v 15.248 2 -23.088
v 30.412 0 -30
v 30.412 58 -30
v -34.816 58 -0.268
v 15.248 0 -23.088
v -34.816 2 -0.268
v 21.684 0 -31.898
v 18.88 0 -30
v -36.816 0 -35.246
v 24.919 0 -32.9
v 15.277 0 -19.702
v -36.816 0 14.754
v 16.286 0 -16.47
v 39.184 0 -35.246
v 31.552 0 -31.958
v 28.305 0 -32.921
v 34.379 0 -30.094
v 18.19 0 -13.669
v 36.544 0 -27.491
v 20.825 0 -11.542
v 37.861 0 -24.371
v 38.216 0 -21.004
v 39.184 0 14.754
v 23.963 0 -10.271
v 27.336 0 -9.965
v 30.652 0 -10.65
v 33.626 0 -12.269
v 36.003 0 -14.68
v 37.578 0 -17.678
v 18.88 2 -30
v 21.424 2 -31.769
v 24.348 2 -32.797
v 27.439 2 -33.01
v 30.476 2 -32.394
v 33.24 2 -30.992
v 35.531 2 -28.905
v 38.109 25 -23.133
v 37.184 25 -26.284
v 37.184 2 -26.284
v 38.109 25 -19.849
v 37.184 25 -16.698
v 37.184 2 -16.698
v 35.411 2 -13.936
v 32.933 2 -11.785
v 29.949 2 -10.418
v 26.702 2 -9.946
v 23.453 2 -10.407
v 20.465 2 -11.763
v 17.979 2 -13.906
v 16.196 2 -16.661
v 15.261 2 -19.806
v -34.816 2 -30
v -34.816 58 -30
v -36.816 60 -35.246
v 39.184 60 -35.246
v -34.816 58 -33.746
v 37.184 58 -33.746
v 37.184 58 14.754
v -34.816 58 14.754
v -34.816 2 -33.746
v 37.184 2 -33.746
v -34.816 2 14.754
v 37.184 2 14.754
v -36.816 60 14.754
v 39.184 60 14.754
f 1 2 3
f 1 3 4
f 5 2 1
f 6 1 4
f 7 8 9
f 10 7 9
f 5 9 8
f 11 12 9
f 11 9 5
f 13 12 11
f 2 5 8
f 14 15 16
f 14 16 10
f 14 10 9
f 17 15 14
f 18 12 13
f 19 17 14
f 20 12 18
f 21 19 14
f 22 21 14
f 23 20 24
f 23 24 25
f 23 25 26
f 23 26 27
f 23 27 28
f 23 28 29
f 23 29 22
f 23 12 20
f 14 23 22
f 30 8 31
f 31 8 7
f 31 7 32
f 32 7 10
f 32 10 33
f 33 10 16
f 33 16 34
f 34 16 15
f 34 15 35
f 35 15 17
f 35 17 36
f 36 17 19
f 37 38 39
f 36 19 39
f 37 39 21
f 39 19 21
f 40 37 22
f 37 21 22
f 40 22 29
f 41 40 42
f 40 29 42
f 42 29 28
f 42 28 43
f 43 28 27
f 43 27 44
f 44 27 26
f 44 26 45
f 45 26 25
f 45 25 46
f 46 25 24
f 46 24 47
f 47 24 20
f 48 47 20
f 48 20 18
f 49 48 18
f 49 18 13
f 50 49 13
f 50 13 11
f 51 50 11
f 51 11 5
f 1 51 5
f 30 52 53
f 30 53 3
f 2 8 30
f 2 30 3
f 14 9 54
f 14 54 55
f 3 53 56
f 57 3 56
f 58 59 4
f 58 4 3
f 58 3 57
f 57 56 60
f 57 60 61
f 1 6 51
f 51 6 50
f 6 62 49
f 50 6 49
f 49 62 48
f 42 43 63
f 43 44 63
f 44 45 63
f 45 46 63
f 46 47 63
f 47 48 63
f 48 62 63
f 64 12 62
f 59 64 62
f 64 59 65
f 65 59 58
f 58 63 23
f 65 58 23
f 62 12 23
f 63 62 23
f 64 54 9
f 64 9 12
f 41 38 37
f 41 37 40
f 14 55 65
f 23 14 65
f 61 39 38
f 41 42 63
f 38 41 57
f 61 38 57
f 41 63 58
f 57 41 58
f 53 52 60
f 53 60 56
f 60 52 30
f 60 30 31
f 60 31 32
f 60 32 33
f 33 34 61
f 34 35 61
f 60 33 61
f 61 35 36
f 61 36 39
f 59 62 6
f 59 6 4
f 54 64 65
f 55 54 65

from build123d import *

# Parameters (mm, degrees)
F0_W     = 76
F0_H     = 50
F1_DEPTH = 60
F2_W     = 72
F2_H     = 56
F3_DEPTH = 48.5
F4_R     = 11.544543
F5_DEPTH = 25
F7_DEPTH = 58


with BuildPart() as f1:
    # F0 (on Front) → F1 (new body)
    with BuildSketch(Plane.XZ):
        with Locations((1.184214, -10.245586)):
            Rectangle(F0_W, F0_H)
    extrude(amount=-F1_DEPTH)

    # F2 (on face) → F3 (cut)
    with BuildSketch(Plane.XY.offset(14.754414)):
        with Locations((1.184214, 30)):
            Rectangle(F2_W, F2_H)
    extrude(amount=-F3_DEPTH, mode=Mode.SUBTRACT)

    # F4 (on face) → F5 (cut)
    with BuildSketch(Plane.XZ):
        with Locations((26.681723, -21.490686)):
            Circle(F4_R)
    extrude(amount=-F5_DEPTH, mode=Mode.SUBTRACT)

    # F6 (on Front) → F7 (join)
    with BuildSketch(Plane.XZ):
        Polygon((-35.402854, 0), (-35.402854, -30), (30.412122, -30), align=None)
    extrude(amount=-F7_DEPTH)


solid = f1.part
